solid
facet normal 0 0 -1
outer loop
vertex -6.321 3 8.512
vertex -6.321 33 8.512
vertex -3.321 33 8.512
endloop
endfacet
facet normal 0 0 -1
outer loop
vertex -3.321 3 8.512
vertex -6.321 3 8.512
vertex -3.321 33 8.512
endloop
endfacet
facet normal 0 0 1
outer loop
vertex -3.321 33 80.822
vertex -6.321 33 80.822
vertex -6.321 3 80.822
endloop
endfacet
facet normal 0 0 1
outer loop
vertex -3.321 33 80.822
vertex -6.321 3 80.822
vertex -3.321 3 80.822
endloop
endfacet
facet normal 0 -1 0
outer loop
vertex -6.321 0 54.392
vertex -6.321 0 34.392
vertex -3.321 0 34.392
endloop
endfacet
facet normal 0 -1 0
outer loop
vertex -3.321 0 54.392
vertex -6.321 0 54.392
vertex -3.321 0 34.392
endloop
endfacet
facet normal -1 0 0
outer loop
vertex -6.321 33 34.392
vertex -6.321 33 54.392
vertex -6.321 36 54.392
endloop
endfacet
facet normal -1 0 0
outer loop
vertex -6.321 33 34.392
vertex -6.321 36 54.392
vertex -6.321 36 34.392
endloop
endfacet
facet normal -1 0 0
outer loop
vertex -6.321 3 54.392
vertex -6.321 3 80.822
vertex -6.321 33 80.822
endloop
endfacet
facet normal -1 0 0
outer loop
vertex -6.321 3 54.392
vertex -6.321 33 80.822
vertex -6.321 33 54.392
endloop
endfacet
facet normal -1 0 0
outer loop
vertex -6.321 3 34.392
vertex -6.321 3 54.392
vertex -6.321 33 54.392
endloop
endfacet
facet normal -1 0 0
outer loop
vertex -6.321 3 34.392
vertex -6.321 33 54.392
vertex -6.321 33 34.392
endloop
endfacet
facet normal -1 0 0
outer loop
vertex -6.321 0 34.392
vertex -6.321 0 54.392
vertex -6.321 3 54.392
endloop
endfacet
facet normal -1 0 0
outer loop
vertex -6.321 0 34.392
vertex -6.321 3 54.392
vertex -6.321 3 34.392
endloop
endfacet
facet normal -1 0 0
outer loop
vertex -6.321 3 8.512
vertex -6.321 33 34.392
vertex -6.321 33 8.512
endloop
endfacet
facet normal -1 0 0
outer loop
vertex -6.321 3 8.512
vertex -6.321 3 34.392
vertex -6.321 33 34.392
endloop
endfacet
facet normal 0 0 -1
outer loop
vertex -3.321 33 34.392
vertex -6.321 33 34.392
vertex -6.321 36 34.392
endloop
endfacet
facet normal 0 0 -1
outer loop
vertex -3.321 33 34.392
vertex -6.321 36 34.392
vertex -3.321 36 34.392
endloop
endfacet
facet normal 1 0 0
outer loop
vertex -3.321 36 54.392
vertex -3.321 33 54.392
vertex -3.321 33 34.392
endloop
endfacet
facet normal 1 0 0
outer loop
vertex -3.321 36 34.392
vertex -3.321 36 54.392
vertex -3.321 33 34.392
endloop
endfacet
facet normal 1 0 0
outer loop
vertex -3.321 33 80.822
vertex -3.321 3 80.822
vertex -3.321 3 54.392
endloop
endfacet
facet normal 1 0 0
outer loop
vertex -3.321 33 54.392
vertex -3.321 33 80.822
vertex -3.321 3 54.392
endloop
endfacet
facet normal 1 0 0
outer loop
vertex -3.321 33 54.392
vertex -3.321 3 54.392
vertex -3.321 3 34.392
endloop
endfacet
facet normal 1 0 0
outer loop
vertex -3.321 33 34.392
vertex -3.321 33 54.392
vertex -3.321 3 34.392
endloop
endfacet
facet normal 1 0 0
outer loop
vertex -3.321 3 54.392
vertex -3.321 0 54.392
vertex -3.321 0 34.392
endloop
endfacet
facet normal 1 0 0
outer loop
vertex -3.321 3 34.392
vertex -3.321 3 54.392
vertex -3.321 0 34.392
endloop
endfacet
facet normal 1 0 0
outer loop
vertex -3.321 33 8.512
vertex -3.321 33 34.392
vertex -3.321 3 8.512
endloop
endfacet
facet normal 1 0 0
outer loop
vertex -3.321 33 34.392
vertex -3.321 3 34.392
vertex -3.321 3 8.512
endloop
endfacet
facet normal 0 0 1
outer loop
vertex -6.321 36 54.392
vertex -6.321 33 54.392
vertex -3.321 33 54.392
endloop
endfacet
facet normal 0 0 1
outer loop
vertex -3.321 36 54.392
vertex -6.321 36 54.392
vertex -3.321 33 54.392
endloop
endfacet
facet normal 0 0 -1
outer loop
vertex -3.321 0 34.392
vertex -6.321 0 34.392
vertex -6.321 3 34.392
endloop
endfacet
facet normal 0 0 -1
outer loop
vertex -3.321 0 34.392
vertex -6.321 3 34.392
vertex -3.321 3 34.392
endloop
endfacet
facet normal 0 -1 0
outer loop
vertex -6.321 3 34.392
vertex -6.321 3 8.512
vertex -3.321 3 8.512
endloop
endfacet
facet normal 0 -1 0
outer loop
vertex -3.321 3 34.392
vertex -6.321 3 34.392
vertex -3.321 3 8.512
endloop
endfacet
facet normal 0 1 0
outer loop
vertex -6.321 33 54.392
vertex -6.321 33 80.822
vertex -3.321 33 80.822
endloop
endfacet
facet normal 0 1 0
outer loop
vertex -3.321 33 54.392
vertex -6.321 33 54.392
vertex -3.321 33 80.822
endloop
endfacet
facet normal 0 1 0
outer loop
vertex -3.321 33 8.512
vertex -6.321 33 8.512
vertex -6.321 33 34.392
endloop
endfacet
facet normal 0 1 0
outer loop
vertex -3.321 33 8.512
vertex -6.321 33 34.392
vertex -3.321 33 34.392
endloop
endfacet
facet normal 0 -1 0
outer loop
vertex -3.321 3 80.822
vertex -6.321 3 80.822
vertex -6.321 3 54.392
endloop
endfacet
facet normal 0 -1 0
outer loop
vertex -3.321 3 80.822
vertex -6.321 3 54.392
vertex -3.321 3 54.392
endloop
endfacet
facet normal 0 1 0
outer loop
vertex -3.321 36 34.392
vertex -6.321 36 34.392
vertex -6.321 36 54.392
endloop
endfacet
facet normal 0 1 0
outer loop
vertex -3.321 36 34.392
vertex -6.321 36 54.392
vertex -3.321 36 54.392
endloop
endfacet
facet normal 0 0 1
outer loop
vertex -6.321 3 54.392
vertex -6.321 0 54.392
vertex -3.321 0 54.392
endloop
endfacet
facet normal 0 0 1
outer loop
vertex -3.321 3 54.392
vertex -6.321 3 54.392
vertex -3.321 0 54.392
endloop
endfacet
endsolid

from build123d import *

# Parameters (mm, degrees)
SKETCH1_W           = 3
SKETCH1_H           = 20
BOSS_EXTRUDE1_DEPTH = 3
SKETCH2_W           = 3
SKETCH2_H           = 72.31
BOSS_EXTRUDE2_DEPTH = 30
SKETCH3_W           = 3
SKETCH3_H           = 20
BOSS_EXTRUDE3_DEPTH = 3


with BuildPart() as part:
    # Sketch1 → Boss-Extrude1 (new body)
    with BuildSketch(Plane(origin=(0, 0, 0), x_dir=(1, 0, 0), z_dir=(0, 1, 0))):
        with Locations((-4.820734675, -44.391585228)):
            Rectangle(SKETCH1_W, SKETCH1_H)
    extrude(amount=BOSS_EXTRUDE1_DEPTH)

    # Sketch2 → Boss-Extrude2 (add)
    with BuildSketch(Plane(origin=(0, 3, 0), x_dir=(1, 0, 0), z_dir=(0, 1, 0))):
        with Locations((-4.820734675, -44.66687809)):
            Rectangle(SKETCH2_W, SKETCH2_H)
    extrude(amount=BOSS_EXTRUDE2_DEPTH)

    # Sketch3 → Boss-Extrude3 (add)
    with BuildSketch(Plane(origin=(0, 33, 0), x_dir=(1, 0, 0), z_dir=(0, 1, 0))):
        with Locations((-4.820734675, -44.391585228)):
            Rectangle(SKETCH3_W, SKETCH3_H)
    extrude(amount=BOSS_EXTRUDE3_DEPTH)


solid = part.part
